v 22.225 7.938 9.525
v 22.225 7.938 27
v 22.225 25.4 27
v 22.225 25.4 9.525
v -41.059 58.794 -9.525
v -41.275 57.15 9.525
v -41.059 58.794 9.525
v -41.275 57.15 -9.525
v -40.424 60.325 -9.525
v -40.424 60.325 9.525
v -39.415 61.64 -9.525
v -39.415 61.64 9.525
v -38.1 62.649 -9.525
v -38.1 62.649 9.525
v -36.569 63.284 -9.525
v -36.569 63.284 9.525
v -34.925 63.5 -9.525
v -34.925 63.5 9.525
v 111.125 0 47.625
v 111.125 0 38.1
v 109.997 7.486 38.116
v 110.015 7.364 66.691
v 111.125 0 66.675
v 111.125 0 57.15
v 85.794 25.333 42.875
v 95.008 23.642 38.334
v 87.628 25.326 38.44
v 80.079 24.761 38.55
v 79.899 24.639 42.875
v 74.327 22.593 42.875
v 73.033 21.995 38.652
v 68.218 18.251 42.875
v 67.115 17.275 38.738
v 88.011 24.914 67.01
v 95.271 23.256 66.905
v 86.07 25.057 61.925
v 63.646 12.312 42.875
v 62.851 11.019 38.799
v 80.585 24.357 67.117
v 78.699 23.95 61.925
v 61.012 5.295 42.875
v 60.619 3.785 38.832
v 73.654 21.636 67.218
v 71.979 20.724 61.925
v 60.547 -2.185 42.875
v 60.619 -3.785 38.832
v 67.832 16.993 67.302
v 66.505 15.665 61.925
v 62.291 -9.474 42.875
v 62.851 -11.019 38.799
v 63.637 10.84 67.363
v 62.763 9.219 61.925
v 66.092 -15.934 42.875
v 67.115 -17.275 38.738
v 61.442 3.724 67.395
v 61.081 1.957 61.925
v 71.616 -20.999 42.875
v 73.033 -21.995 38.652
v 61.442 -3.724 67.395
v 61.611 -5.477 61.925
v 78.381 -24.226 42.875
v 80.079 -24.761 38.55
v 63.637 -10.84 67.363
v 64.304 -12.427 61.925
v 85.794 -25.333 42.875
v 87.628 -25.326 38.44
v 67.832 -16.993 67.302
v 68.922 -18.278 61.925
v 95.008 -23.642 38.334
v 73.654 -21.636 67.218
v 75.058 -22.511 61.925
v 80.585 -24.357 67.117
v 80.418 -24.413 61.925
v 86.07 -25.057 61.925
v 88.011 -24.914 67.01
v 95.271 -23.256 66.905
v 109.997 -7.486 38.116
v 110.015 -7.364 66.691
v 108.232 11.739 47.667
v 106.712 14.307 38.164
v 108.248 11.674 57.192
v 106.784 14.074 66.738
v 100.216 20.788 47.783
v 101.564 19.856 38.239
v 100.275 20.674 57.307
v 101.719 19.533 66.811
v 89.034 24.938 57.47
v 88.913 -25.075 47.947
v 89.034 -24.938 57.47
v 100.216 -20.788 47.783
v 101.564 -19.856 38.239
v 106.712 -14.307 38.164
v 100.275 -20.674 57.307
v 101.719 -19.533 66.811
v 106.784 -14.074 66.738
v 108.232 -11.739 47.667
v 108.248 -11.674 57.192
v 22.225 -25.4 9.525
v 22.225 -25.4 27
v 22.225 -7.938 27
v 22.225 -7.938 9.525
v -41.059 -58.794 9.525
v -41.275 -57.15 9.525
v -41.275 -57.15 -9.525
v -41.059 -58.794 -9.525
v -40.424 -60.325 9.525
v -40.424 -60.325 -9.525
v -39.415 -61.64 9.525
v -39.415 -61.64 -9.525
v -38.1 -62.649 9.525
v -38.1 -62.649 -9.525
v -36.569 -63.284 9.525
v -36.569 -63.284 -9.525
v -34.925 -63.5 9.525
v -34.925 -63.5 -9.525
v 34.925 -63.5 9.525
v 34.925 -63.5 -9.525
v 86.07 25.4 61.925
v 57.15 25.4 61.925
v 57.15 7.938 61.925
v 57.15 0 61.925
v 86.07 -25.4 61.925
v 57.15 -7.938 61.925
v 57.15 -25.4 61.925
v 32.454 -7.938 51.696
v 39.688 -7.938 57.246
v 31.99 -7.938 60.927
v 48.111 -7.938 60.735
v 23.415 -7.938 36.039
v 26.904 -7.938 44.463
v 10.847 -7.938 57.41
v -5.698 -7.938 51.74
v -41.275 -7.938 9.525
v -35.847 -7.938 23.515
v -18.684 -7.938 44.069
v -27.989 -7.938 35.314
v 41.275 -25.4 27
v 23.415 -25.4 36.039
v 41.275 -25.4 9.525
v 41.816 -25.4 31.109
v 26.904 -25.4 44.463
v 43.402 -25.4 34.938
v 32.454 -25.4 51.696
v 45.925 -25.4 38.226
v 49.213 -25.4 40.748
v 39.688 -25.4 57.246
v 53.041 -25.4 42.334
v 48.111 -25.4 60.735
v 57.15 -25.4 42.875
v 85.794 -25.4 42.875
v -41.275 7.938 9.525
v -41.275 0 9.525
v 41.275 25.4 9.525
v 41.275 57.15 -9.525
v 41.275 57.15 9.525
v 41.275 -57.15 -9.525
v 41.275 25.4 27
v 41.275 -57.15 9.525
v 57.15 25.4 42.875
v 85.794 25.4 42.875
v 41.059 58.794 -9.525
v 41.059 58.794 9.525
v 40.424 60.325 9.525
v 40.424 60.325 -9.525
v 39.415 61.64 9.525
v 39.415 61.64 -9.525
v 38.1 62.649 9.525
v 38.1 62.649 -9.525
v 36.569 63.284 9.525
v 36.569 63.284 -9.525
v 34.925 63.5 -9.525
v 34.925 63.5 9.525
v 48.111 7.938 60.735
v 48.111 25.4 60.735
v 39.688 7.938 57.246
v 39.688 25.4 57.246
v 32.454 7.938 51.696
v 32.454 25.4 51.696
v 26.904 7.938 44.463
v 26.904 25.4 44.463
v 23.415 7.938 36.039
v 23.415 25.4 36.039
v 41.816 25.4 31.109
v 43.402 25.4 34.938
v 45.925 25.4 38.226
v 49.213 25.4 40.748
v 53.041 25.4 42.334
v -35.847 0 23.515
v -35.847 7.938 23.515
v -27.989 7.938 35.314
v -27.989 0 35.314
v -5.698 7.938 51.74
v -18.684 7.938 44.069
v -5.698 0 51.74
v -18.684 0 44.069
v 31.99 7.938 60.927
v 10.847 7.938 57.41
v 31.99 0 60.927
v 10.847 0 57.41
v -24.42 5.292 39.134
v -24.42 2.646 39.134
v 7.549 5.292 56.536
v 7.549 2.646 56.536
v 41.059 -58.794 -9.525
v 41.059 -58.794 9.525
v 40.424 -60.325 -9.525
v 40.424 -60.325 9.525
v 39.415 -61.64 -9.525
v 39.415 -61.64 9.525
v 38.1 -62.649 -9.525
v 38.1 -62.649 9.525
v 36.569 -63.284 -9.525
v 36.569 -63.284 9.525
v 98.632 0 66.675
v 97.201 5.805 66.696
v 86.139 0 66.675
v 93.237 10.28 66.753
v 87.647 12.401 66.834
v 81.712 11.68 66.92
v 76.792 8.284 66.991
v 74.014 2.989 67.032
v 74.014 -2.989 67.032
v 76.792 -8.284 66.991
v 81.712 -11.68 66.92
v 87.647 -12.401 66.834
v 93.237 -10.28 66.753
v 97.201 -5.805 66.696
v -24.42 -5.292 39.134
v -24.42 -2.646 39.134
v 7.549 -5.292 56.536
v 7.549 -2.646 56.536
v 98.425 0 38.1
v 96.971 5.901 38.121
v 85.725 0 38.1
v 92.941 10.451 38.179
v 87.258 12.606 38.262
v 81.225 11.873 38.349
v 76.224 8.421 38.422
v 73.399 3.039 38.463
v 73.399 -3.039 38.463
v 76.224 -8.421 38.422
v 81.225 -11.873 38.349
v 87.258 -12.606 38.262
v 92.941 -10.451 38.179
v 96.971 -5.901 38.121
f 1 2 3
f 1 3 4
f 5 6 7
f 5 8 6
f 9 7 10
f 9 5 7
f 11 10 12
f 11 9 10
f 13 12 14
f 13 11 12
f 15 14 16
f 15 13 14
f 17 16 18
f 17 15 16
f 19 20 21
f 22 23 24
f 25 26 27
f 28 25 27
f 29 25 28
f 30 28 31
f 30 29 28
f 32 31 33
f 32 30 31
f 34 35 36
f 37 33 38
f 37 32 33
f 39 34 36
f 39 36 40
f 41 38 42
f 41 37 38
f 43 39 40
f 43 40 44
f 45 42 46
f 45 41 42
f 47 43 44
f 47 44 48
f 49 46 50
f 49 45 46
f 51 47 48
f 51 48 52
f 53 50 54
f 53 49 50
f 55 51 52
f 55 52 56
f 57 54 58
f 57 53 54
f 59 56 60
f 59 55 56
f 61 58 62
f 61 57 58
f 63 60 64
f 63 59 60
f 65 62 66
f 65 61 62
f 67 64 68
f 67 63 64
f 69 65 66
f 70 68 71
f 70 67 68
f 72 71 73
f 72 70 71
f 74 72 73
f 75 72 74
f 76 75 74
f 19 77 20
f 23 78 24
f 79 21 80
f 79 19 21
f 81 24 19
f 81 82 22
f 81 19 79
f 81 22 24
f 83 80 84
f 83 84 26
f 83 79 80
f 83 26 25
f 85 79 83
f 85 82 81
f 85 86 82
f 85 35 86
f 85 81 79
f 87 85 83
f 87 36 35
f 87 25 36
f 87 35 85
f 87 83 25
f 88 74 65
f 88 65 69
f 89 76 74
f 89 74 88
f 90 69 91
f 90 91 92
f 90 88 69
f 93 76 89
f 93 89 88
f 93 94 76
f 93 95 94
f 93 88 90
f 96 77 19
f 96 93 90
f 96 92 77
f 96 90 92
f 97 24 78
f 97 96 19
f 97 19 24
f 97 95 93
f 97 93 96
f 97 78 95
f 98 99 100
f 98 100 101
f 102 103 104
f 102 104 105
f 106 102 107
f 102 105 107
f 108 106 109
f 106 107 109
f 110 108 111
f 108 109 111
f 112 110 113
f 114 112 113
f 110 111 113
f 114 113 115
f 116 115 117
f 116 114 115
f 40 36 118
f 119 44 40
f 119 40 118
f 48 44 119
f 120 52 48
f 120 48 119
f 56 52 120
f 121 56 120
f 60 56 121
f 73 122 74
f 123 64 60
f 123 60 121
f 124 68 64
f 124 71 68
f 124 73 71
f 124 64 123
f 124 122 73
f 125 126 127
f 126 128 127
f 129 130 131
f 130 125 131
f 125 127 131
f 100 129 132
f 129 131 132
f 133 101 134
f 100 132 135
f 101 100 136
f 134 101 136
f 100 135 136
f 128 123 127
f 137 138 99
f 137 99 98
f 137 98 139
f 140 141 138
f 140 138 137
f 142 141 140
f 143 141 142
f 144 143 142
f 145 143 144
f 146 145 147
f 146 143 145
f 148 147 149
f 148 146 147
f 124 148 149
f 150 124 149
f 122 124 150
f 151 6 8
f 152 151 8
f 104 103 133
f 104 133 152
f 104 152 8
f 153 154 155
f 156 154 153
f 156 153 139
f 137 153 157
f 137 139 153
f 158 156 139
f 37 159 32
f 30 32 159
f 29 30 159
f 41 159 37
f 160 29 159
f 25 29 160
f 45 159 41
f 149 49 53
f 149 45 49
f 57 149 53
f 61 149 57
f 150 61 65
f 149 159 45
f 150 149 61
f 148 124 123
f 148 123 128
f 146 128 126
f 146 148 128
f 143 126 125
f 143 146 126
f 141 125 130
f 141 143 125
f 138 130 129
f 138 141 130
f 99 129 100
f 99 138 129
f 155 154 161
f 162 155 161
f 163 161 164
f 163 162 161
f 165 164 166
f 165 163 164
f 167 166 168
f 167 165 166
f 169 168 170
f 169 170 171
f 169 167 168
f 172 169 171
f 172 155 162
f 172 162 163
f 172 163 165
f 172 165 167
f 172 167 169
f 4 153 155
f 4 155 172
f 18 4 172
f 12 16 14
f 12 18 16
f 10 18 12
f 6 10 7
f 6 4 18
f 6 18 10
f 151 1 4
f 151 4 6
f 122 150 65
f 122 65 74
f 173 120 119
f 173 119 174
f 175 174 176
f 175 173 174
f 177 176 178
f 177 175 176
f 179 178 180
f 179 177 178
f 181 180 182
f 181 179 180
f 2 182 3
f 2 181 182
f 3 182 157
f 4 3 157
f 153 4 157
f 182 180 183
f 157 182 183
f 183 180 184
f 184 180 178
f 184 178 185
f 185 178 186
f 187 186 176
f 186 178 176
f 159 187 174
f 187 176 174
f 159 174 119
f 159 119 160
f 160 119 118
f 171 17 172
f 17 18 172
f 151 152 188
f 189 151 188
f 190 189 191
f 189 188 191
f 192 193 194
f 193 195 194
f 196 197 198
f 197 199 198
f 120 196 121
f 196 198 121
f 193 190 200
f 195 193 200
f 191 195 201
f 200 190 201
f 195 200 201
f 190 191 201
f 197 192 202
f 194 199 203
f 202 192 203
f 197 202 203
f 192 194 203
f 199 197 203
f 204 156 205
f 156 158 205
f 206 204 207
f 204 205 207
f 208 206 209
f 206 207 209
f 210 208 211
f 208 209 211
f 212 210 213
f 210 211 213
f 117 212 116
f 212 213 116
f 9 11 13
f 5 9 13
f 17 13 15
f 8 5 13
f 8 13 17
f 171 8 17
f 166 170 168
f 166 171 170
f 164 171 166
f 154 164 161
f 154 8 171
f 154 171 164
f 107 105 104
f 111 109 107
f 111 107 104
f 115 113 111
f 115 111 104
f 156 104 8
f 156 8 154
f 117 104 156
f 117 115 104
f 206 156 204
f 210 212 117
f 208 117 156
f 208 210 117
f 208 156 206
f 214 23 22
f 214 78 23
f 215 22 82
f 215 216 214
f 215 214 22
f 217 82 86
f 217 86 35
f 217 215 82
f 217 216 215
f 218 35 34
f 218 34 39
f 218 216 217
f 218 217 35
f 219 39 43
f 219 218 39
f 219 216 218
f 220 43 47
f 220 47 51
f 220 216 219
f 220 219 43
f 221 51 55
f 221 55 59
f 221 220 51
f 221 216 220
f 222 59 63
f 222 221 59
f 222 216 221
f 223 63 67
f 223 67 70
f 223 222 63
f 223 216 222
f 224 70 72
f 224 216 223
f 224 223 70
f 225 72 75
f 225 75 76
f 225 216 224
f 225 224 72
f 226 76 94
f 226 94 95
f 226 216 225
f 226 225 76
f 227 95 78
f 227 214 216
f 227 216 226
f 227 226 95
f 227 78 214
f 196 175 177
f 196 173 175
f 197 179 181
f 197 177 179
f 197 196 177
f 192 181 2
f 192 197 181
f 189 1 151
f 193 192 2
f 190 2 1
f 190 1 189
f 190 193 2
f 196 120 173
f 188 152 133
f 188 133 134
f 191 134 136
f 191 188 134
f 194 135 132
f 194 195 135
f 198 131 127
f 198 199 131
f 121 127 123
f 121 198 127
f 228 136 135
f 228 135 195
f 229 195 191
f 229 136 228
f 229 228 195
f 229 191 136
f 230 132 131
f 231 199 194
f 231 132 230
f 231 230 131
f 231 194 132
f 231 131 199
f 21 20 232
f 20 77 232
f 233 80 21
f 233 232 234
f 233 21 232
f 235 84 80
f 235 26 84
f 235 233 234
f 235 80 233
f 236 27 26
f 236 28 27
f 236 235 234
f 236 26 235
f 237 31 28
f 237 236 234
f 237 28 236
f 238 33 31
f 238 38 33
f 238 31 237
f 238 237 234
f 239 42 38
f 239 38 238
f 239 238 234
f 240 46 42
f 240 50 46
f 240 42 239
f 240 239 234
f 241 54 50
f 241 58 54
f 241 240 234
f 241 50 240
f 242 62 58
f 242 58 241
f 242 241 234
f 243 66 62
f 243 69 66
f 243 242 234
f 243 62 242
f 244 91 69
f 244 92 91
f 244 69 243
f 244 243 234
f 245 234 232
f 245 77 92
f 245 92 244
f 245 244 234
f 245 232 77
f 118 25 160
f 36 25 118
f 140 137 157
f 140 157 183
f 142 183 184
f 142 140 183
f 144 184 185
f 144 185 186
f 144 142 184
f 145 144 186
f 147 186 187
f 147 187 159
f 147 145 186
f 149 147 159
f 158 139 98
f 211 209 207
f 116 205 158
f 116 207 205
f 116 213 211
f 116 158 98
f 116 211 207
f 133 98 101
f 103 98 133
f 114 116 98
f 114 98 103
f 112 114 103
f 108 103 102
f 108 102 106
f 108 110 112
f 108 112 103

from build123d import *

# Parameters (mm, degrees)
F1_DEPTH = 63.5
F2_DEPTH = 25.4
F3_DEPTH = 7.9375
F5_R     = 6.35


with BuildPart() as f1:
    # F0 (on Front) → F1 (new body, symmetric)
    with BuildSketch(Plane.XZ):
        Polygon((-41.275, -9.525), (41.275, -9.525), (41.275, 9.525), (22.225, 9.525), (-41.275, 9.525), align=None)
    extrude(amount=F1_DEPTH, both=True)

    # F0 (on Front) → F2 (join, symmetric)
    with BuildSketch(Plane.XZ):
        Polygon((86.0701791132, 61.9252), (60.325, 61.9252), (60.325, 42.8752), (85.7941830205, 42.8752), align=None)
        with BuildLine():
            Line((22.225, 9.525), (41.275, 9.525))
            Line((41.275, 9.525), (41.275, 27.0002))
            ThreePointArc((41.275, 27.0002), (45.9246798487, 38.2255201513), (57.15, 42.8752))
            Line((57.15, 42.8752), (60.325, 42.8752))
            Line((60.325, 42.8752), (60.325, 61.9252))
            Line((60.325, 61.9252), (57.15, 61.9252))
            ThreePointArc((57.15, 61.9252), (32.4542956671, 51.6959043329), (22.225, 27.0002))
            Line((22.225, 27.0002), (22.225, 9.525))
        make_face()
    extrude(amount=F2_DEPTH, both=True)

    # F0 (on Front) → F3 (join, symmetric)
    with BuildSketch(Plane.XZ):
        with BuildLine():
            add(Edge.make_bspline(
                [(-41.275, 9.525), (-31.1370120476, 45.302397555), (-2.1070703483, 62.4784893272), (57.15, 61.9252)],
                knots=[0, 0, 0, 0, 111.5045361635, 111.5045361635, 111.5045361635, 111.5045361635], degree=3))
            Line((-41.275, 9.525), (22.225, 9.525))
            Line((22.225, 9.525), (22.225, 27.0002))
            ThreePointArc((22.225, 27.0002), (32.4542956671, 51.6959043329), (57.15, 61.9252))
        make_face()
    extrude(amount=F3_DEPTH, both=True)

    # F0 (on Front) → F4 (revolve)
    with BuildSketch(Plane.XZ):
        Polygon((86.1389941389, 66.675), (86.0701791132, 61.9252), (85.7941830205, 42.8752), (85.725, 38.1), (111.125, 38.1), (111.125, 66.675), align=None)
    revolve(axis=Axis((85.9319970695, 0, 52.3875), (0.0144864636, 0, 0.9998950657)))

    # F5
    f5_edges = [f1.edges().sort_by_distance(p)[0] for p in [
        (41.275, -63.5, 0),
        (-41.275, -63.5, 0),
        (-41.275, 63.5, 0),
        (41.275, 63.5, 0),
    ]]
    fillet(f5_edges, radius=F5_R)


solid = f1.part
